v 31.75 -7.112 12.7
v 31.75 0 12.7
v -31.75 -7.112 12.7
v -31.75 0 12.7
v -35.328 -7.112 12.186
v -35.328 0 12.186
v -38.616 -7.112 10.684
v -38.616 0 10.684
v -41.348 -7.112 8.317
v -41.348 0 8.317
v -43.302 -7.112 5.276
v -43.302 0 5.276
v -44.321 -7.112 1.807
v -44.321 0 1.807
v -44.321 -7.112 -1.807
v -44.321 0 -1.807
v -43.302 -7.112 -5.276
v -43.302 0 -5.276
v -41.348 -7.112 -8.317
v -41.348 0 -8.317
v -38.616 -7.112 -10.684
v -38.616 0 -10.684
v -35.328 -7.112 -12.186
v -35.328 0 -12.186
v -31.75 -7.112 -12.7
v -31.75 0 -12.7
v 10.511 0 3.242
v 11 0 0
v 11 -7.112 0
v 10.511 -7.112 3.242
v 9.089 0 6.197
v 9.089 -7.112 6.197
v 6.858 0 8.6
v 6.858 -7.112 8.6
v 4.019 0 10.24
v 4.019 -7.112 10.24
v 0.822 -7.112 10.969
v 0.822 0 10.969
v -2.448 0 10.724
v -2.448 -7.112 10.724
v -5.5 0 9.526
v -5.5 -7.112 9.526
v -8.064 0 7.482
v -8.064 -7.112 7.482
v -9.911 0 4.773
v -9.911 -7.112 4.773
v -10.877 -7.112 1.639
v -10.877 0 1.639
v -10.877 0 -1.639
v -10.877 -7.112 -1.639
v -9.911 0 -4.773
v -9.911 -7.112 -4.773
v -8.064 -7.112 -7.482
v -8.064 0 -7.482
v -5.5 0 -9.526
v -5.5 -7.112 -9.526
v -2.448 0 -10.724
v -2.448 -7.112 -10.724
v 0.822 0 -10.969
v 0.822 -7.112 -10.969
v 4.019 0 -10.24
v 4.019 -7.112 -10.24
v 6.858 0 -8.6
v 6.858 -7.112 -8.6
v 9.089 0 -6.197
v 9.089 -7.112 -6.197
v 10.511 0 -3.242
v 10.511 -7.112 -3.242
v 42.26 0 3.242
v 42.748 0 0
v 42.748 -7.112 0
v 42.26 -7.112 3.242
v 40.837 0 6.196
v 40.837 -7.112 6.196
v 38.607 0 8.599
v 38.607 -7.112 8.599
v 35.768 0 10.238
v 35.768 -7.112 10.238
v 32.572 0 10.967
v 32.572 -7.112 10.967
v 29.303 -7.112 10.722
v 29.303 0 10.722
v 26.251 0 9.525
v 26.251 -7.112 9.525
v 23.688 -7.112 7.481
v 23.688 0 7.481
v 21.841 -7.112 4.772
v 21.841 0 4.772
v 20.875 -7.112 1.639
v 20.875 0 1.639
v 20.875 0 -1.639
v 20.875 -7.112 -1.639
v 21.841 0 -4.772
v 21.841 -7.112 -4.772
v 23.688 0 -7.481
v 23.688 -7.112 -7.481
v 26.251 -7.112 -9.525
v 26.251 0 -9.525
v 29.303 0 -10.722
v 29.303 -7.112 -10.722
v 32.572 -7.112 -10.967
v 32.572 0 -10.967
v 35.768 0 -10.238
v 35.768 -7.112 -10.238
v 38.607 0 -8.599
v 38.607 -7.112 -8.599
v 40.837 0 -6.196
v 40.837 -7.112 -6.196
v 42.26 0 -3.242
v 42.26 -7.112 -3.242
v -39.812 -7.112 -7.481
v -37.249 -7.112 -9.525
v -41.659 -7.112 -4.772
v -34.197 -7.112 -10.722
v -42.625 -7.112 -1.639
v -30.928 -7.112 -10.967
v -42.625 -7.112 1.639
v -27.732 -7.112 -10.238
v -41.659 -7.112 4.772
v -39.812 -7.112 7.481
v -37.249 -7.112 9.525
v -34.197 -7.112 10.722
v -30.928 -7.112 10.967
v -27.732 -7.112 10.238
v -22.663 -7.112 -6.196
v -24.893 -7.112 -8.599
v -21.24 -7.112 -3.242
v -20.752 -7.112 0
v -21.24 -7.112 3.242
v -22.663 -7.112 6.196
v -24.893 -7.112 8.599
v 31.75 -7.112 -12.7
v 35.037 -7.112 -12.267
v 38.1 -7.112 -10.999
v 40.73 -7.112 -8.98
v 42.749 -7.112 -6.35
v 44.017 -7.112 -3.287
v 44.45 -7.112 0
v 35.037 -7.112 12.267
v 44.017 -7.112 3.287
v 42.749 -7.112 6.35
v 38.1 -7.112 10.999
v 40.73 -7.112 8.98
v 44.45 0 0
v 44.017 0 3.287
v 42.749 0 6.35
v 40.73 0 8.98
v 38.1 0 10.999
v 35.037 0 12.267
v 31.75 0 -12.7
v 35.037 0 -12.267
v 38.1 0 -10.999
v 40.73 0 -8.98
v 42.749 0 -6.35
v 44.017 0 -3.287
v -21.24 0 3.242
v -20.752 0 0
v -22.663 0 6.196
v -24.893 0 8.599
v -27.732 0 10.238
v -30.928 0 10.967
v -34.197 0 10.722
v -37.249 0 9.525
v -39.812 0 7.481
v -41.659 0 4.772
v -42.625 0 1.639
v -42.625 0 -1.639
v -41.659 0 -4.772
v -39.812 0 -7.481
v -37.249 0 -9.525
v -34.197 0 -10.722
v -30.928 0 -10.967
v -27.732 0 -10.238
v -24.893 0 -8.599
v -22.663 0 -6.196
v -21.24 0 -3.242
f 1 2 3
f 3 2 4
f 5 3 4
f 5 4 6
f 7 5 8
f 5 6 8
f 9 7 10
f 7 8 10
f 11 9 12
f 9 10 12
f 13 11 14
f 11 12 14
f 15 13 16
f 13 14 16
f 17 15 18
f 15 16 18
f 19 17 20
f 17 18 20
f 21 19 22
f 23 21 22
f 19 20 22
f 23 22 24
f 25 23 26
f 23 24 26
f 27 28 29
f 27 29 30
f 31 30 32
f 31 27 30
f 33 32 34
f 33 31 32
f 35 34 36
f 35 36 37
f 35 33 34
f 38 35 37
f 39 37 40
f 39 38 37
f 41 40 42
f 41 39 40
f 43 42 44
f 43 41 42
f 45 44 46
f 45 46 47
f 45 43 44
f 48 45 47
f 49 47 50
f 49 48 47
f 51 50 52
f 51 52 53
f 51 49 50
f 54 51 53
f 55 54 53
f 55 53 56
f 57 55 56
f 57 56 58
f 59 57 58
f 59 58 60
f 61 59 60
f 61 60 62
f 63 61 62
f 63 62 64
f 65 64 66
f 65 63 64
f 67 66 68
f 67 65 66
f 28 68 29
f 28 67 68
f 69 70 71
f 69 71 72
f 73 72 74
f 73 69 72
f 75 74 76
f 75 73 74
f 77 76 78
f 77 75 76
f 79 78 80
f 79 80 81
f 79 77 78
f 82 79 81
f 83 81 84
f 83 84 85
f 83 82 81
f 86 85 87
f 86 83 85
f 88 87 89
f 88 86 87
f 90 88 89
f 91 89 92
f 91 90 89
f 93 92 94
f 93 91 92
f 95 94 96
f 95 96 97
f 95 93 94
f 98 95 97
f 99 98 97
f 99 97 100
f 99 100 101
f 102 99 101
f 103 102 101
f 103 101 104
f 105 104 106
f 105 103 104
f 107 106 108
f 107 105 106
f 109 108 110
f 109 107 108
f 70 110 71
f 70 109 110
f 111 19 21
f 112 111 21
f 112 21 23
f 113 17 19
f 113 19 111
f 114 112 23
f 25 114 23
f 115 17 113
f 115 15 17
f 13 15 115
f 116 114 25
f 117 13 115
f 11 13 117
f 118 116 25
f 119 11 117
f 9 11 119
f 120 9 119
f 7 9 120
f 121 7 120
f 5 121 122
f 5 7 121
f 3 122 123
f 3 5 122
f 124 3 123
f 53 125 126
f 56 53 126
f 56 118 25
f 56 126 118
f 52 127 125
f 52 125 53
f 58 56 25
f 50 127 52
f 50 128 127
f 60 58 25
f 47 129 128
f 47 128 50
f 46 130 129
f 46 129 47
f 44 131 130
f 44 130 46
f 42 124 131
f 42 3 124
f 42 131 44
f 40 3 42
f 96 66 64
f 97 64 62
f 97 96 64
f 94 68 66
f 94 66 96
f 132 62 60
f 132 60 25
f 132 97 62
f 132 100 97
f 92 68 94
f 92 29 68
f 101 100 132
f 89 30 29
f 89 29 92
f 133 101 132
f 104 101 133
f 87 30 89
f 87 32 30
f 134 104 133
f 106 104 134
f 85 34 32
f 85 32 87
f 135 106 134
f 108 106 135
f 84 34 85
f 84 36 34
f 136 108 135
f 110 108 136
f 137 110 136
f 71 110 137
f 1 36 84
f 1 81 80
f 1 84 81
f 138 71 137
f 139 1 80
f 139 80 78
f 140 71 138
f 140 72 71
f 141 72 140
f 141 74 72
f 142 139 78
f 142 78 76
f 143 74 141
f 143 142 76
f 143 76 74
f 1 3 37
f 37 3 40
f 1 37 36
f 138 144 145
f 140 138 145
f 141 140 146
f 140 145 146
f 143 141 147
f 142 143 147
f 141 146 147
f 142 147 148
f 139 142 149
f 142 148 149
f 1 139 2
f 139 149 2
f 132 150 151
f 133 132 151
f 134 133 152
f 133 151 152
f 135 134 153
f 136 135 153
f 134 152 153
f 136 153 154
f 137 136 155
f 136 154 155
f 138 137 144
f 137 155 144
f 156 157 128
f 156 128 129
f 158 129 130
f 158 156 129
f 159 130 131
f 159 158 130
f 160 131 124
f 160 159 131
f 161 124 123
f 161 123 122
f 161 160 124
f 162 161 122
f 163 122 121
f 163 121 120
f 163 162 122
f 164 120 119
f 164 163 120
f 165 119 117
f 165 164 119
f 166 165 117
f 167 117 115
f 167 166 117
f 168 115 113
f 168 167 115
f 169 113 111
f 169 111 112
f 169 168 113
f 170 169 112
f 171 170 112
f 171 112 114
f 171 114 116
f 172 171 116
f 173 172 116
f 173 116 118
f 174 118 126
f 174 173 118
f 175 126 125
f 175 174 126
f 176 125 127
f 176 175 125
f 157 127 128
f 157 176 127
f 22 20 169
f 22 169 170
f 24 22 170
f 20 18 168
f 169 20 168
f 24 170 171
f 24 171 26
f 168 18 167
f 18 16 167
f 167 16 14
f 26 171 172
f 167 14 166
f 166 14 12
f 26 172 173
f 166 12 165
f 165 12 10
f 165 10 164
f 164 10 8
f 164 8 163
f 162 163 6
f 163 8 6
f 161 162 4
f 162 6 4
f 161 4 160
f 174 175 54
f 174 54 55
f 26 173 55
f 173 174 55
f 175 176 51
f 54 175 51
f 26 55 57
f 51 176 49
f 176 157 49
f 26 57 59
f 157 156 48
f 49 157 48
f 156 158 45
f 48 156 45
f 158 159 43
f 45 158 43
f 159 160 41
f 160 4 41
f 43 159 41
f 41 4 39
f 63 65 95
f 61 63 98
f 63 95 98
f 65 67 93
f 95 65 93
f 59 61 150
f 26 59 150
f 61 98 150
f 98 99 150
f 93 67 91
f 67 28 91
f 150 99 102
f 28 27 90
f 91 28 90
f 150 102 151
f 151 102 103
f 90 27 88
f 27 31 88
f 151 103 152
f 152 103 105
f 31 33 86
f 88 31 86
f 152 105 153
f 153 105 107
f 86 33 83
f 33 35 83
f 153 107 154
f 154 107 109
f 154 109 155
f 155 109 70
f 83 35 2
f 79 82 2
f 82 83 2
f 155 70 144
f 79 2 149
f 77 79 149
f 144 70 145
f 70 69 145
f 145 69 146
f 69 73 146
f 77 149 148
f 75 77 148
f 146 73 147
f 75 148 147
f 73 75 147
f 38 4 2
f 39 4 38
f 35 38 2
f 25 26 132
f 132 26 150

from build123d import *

# Parameters (mm, degrees)
F0_R     = 10.9982
F0_R_2   = 11
F1_DEPTH = 7.112


# Not quite as in the source:
# - a feature names something its author has since deleted; it is built from what else it names


with BuildPart() as f1:
    # F0 (on Front) → F1 (new body)
    with BuildSketch(Plane.XZ):
        with BuildLine():
            ThreePointArc((44.45, 0), (40.7302561211, 8.9802561211), (31.75, 12.7))
            ThreePointArc((31.75, 12.7), (19.05, 0), (31.75, -12.7))
            ThreePointArc((31.75, -12.7), (40.7302561211, -8.9802561211), (44.45, 0))
        make_face()
        with Locations((31.75, 0)):
            Circle(F0_R, mode=Mode.SUBTRACT)
        with BuildLine():
            ThreePointArc((-31.75, -12.7), (-22.7697438789, -8.9802561211), (-19.05, 0))
            ThreePointArc((-19.05, 0), (-22.7697438789, 8.9802561211), (-31.75, 12.7))
            ThreePointArc((-31.75, 12.7), (-44.45, 0), (-31.75, -12.7))
        make_face()
        with Locations((-31.75, 0)):
            Circle(F0_R, mode=Mode.SUBTRACT)
        with BuildLine():
            ThreePointArc((-31.75, 12.7), (-22.7697438789, 8.9802561211), (-19.05, 0))
            ThreePointArc((-19.05, 0), (-22.7697438789, -8.9802561211), (-31.75, -12.7))
            Line((-31.75, -12.7), (31.75, -12.7))
            ThreePointArc((31.75, -12.7), (19.05, 0), (31.75, 12.7))
            Line((31.75, 12.7), (-31.75, 12.7))
        make_face()
        Circle(F0_R_2, mode=Mode.SUBTRACT)
    extrude(amount=F1_DEPTH)


solid = f1.part
